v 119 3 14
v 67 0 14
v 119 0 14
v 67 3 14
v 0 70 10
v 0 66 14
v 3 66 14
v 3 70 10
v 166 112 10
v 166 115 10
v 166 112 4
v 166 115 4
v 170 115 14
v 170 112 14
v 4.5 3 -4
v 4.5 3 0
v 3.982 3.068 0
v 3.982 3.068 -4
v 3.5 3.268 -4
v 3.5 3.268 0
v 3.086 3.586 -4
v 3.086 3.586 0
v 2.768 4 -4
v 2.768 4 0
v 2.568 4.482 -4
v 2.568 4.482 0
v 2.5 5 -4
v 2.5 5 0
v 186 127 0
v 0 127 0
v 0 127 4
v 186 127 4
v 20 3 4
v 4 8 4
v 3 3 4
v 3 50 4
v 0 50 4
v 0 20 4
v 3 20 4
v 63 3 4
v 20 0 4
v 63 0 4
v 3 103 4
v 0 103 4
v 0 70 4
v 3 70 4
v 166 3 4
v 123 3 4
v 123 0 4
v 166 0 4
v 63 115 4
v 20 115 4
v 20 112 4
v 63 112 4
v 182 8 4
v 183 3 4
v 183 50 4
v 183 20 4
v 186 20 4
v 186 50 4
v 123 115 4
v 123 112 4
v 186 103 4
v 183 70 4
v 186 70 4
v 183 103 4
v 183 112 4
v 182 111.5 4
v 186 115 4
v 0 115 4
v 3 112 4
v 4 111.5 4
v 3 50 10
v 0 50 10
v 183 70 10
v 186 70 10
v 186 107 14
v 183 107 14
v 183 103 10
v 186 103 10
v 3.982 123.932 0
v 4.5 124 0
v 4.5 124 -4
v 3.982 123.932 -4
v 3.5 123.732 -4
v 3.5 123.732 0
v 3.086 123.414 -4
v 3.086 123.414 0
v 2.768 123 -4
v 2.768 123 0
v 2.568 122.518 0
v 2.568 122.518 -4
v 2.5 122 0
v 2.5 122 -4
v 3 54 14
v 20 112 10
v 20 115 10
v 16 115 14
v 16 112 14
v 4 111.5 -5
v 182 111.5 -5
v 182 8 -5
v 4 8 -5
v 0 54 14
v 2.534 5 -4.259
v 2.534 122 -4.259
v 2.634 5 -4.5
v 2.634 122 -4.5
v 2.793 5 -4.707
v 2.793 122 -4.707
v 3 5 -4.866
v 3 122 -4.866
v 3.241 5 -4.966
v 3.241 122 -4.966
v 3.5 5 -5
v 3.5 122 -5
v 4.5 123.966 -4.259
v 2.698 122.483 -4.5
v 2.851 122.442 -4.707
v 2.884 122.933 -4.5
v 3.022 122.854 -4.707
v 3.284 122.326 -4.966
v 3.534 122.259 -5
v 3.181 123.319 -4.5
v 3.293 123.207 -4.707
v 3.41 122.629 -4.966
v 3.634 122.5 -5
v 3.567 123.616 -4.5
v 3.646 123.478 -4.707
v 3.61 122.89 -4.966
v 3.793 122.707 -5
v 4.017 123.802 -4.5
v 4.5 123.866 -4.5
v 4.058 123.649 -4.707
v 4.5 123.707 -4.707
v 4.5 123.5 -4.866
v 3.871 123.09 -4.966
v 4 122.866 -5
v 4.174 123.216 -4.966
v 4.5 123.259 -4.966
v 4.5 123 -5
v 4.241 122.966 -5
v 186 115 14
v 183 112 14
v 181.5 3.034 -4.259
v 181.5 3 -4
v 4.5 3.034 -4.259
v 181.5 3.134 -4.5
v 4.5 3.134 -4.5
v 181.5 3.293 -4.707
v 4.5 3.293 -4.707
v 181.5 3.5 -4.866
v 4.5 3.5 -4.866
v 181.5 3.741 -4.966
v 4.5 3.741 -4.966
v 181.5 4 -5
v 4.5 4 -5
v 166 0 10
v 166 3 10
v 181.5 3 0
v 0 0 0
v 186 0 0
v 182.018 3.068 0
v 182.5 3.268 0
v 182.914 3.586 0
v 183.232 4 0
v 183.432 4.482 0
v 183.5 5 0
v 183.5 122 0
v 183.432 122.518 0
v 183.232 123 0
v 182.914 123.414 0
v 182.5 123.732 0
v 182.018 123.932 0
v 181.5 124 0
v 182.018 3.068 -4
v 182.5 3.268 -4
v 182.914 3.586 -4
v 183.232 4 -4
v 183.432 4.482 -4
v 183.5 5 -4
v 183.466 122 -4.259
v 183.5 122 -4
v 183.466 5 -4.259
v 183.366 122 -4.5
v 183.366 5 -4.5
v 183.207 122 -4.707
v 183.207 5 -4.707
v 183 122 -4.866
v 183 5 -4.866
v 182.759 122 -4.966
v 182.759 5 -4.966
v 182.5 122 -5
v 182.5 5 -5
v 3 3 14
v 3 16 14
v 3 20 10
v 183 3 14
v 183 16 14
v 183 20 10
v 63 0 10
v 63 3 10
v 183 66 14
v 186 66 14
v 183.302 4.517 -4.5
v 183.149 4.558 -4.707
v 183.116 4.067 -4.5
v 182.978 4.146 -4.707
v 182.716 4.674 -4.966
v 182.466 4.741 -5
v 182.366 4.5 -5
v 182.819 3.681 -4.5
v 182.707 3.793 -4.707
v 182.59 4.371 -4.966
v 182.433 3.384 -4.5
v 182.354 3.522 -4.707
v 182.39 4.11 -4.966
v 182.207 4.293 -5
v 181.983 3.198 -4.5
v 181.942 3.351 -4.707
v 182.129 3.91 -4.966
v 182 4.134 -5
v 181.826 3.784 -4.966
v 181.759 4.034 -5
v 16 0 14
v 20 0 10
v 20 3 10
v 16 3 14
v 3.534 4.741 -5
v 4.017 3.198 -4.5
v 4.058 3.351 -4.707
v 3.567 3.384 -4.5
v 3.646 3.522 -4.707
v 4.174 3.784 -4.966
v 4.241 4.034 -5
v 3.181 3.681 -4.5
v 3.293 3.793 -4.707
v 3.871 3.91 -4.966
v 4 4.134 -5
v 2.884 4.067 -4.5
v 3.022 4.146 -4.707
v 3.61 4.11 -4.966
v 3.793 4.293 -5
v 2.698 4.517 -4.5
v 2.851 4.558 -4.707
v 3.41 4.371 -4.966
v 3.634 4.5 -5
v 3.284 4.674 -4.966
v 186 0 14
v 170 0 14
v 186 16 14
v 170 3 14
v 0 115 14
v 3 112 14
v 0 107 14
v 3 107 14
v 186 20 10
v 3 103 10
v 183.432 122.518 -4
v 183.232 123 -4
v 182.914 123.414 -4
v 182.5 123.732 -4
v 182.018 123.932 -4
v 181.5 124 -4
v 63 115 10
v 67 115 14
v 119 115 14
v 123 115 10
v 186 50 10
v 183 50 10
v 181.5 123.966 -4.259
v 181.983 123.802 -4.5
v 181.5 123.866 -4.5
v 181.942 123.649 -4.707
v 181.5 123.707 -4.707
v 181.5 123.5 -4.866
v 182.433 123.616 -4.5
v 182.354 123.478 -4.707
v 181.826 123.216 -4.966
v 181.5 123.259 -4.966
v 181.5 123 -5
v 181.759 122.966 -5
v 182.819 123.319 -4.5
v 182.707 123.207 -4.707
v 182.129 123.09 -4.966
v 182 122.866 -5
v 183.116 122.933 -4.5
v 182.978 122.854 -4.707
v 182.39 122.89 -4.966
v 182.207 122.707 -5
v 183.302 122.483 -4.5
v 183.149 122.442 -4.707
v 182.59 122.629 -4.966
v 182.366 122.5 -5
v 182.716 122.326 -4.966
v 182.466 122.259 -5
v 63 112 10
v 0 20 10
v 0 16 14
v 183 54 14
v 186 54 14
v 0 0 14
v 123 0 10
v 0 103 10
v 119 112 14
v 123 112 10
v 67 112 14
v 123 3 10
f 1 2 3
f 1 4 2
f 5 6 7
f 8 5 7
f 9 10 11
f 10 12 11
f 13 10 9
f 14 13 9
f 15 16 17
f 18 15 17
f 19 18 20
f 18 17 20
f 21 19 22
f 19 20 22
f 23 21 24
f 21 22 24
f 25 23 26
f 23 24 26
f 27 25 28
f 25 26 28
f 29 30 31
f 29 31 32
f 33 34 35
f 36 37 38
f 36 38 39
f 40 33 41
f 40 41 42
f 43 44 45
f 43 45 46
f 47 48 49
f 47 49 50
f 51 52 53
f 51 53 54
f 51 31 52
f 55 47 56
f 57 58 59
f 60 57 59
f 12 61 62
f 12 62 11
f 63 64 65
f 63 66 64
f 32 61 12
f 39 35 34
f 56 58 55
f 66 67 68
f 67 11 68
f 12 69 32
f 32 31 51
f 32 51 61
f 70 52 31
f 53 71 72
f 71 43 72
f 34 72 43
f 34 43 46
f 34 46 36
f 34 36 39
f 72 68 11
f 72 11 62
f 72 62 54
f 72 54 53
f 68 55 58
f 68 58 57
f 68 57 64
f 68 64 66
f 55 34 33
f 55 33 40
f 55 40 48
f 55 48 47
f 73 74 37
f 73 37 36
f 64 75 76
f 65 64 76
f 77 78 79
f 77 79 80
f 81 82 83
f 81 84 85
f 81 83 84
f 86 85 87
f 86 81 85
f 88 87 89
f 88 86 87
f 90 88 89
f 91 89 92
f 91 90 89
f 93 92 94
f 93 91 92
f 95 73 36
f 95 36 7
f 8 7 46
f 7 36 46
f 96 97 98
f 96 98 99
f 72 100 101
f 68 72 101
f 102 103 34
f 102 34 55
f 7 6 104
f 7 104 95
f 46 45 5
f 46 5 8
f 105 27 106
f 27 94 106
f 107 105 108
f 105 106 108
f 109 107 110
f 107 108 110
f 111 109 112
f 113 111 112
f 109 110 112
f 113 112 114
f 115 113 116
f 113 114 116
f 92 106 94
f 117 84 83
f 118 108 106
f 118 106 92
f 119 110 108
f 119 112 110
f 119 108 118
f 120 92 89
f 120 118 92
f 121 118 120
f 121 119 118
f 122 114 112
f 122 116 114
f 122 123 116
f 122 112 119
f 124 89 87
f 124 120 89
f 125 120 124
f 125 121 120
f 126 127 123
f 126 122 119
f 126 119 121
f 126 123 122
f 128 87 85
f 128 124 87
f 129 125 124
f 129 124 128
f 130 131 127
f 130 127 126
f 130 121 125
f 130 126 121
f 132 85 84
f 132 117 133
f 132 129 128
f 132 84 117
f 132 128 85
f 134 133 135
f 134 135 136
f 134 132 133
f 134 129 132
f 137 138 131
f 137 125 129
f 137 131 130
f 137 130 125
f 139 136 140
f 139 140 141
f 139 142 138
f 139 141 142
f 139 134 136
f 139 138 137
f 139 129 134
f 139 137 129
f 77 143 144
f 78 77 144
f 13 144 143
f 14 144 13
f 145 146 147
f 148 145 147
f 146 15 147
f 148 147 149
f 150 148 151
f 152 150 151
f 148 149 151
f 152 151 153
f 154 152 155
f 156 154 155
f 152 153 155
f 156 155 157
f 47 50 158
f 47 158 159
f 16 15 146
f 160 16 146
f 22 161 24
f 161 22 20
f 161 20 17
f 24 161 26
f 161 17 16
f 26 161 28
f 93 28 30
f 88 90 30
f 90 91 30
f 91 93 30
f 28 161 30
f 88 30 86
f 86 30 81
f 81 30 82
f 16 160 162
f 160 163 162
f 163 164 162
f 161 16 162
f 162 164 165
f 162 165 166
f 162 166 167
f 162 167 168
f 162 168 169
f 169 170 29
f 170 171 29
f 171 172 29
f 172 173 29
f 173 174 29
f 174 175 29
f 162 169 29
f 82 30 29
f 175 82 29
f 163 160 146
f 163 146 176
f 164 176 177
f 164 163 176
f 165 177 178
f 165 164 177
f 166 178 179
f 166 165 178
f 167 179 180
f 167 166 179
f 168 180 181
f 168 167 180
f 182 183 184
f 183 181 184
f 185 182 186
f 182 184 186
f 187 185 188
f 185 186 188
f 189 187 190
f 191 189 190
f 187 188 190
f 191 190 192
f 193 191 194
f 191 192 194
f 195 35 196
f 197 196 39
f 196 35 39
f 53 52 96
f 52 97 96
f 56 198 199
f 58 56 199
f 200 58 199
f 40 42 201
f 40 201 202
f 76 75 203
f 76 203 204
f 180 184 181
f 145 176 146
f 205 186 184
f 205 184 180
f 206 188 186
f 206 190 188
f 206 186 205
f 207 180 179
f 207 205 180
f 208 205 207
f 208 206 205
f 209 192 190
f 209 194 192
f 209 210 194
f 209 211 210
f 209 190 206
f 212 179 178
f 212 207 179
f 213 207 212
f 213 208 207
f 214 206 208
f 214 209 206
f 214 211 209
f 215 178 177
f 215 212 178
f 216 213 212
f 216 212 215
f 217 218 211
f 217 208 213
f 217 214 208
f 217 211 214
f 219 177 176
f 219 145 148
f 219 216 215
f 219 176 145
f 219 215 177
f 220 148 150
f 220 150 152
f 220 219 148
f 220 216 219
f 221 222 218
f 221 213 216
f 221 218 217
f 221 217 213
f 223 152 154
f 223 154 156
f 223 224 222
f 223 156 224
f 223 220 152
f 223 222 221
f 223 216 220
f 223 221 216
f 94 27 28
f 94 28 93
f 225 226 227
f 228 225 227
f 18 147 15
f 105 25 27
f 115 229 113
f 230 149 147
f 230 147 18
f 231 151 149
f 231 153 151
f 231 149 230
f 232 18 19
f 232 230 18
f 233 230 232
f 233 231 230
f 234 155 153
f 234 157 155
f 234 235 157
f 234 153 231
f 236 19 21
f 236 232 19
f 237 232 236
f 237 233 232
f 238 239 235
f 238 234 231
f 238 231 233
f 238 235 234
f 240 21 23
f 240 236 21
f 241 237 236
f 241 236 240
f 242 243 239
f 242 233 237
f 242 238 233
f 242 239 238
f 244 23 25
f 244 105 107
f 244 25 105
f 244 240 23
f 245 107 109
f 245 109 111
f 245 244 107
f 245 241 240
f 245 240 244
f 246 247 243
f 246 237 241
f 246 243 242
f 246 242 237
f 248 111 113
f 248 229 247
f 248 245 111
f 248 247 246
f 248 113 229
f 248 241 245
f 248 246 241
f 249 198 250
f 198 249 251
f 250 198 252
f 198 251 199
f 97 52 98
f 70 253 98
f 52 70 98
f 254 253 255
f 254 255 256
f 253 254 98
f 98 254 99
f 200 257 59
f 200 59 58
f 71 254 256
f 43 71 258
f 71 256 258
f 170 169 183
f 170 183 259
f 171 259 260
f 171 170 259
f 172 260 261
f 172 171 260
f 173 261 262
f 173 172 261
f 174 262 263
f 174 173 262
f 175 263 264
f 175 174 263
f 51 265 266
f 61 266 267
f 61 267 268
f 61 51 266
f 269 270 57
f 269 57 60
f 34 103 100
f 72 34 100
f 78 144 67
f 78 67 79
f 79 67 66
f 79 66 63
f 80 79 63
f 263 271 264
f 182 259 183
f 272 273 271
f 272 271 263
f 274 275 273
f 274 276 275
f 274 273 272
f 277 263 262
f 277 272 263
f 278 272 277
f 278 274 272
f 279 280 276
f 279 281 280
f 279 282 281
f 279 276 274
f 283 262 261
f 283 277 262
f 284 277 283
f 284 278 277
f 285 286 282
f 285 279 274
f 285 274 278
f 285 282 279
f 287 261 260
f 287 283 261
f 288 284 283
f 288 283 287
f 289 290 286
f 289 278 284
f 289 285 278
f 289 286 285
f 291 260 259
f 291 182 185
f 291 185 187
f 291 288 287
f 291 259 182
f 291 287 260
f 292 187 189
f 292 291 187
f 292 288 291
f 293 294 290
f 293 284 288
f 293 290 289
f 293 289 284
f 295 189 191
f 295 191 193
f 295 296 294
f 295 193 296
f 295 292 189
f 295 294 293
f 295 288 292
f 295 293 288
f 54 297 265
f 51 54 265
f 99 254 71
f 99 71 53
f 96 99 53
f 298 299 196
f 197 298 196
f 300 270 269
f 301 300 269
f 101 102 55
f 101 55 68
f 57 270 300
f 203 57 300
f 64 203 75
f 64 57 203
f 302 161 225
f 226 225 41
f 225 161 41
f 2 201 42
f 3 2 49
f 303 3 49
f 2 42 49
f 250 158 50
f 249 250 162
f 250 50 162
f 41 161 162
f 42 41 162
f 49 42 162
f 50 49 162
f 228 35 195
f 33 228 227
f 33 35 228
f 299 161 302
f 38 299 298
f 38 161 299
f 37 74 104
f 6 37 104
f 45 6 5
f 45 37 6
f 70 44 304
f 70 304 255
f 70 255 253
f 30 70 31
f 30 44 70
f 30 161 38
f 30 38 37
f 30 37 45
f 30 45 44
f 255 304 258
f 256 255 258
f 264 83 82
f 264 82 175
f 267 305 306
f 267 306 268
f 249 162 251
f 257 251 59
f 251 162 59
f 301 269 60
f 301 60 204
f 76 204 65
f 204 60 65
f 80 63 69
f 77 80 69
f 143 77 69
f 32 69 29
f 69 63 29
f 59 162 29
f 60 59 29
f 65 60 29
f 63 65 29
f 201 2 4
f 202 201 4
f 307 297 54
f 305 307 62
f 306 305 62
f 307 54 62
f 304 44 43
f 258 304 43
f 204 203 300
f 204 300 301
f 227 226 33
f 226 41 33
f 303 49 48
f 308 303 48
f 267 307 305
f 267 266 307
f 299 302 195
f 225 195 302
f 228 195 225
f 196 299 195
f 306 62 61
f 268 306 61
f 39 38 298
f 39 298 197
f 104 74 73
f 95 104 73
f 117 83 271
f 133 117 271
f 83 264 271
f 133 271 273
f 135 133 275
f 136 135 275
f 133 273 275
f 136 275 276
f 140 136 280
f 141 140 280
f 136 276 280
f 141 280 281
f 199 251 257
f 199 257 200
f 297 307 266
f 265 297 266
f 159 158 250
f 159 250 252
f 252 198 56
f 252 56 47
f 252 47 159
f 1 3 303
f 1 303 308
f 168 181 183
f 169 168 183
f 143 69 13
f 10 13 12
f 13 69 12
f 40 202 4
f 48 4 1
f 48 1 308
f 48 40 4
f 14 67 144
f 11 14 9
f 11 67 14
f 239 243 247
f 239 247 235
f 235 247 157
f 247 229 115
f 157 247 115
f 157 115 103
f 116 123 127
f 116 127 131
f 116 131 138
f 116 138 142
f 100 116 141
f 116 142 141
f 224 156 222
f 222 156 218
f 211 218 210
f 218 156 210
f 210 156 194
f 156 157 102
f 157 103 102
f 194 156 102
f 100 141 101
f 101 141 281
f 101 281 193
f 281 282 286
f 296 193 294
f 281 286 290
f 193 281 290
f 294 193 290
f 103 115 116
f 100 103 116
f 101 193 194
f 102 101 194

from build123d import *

# Parameters (mm, degrees)
BOX035_W               = 60
BOX035_H               = 3
BOX035_DEPTH           = 11
BOX034_W               = 200
BOX034_H               = 30
BOX034_DEPTH           = 20
BOX033_W               = 60
BOX033_H               = 3
BOX033_DEPTH           = 11
BOX025_W               = 3
BOX025_H               = 20
BOX025_DEPTH           = 11
BOX026_W               = 3
BOX026_H               = 20
BOX026_DEPTH           = 11
BOX024_W               = 30
BOX024_H               = 20
BOX024_DEPTH           = 11
BOX023_W               = 20
BOX023_H               = 20
BOX023_DEPTH           = 11
CUT010_PLACEMENT_ANGLE = 180
BOX032_W               = 30
BOX032_H               = 20
BOX032_DEPTH           = 11
BOX031_W               = 20
BOX031_H               = 20
BOX031_DEPTH           = 11
CUT013_PLACEMENT_ANGLE = 180
BOX030_W               = 30
BOX030_H               = 20
BOX030_DEPTH           = 11
BOX029_W               = 20
BOX029_H               = 20
BOX029_DEPTH           = 11
CUT012_PLACEMENT_ANGLE = 180
BOX022_W               = 30
BOX022_H               = 20
BOX022_DEPTH           = 11
BOX021_W               = 20
BOX021_H               = 20
BOX021_DEPTH           = 11
CHAMFER006_SIZE        = 4
BOX018_W               = 178
BOX018_H               = 103.5
BOX018_DEPTH           = 30
BOX019_W               = 181
BOX019_H               = 121
BOX019_DEPTH           = 5
BOX017_W               = 186
BOX017_H               = 127
BOX017_DEPTH           = 4
FILLET008_R            = 2
FILLET009_R            = 1


with BuildPart() as cube032:
    # Box035 → Box035 (new body)
    with BuildSketch(Plane(origin=(63, 0, 4), x_dir=(1, 0, 0), z_dir=(0, 0, 1))):
        with Locations((30, 1.5)):
            Rectangle(BOX035_W, BOX035_H)
    extrude(amount=BOX035_DEPTH)


with BuildPart() as cube031:
    # Box034 → Box034 (new body)
    with BuildSketch(Plane(origin=(-10, 73, -5), x_dir=(1, 0, 0), z_dir=(0, 0, 1))):
        with Locations((100, 15)):
            Rectangle(BOX034_W, BOX034_H)
    extrude(amount=BOX034_DEPTH)


with BuildPart() as cube030:
    # Box033 → Box033 (new body)
    with BuildSketch(Plane(origin=(63, 112, 4), x_dir=(1, 0, 0), z_dir=(0, 0, 1))):
        with Locations((30, 1.5)):
            Rectangle(BOX033_W, BOX033_H)
    extrude(amount=BOX033_DEPTH)


with BuildPart() as cube022:
    # Box025 → Box025 (new body)
    with BuildSketch(Plane(origin=(0, 50, 4), x_dir=(1, 0, 0), z_dir=(0, 0, 1))):
        with Locations((1.5, 10)):
            Rectangle(BOX025_W, BOX025_H)
    extrude(amount=BOX025_DEPTH)


with BuildPart() as cube023:
    # Box026 → Box026 (new body)
    with BuildSketch(Plane(origin=(183, 50, 4), x_dir=(1, 0, 0), z_dir=(0, 0, 1))):
        with Locations((1.5, 10)):
            Rectangle(BOX026_W, BOX026_H)
    extrude(amount=BOX026_DEPTH)


with BuildPart() as cube021:
    # Box024 → Box024 (new body)
    with BuildSketch(Plane(origin=(3, 3, 0), x_dir=(1, 0, 0), z_dir=(0, 0, 1))):
        with Locations((15, 10)):
            Rectangle(BOX024_W, BOX024_H)
    extrude(amount=BOX024_DEPTH)


with BuildPart() as cut010:
    # Box023 → Box023 (new body)
    with BuildSketch(Plane.XY):
        with Locations((10, 10)):
            Rectangle(BOX023_W, BOX023_H)
    extrude(amount=BOX023_DEPTH)

    # Cut010: cut Cube021
    add(cube021.part, mode=Mode.SUBTRACT)


with BuildPart() as cut010_1:
    # Cut010 placement: moved
    add(cut010.part.moved(Location((186, 0, 15))).rotate(Axis((186, 0, 15), (0, 1, 0)), CUT010_PLACEMENT_ANGLE))


with BuildPart() as cube029:
    # Box032 → Box032 (new body)
    with BuildSketch(Plane(origin=(3, 3, 0), x_dir=(1, 0, 0), z_dir=(0, 0, 1))):
        with Locations((15, 10)):
            Rectangle(BOX032_W, BOX032_H)
    extrude(amount=BOX032_DEPTH)


with BuildPart() as cut013:
    # Box031 → Box031 (new body)
    with BuildSketch(Plane.XY):
        with Locations((10, 10)):
            Rectangle(BOX031_W, BOX031_H)
    extrude(amount=BOX031_DEPTH)

    # Cut013: cut Cube029
    add(cube029.part, mode=Mode.SUBTRACT)


with BuildPart() as cut013_1:
    # Cut013 placement: moved
    add(cut013.part.moved(Location((186, 115, 4))).rotate(Axis((186, 115, 4), (0, 0, 1)), CUT013_PLACEMENT_ANGLE))


with BuildPart() as cube027:
    # Box030 → Box030 (new body)
    with BuildSketch(Plane(origin=(3, 3, 0), x_dir=(1, 0, 0), z_dir=(0, 0, 1))):
        with Locations((15, 10)):
            Rectangle(BOX030_W, BOX030_H)
    extrude(amount=BOX030_DEPTH)


with BuildPart() as cut012:
    # Box029 → Box029 (new body)
    with BuildSketch(Plane.XY):
        with Locations((10, 10)):
            Rectangle(BOX029_W, BOX029_H)
    extrude(amount=BOX029_DEPTH)

    # Cut012: cut Cube027
    add(cube027.part, mode=Mode.SUBTRACT)


with BuildPart() as cut012_1:
    # Cut012 placement: moved
    add(cut012.part.moved(Location((0, 115, 15))).rotate(Axis((0, 115, 15), (1, 0, 0)), CUT012_PLACEMENT_ANGLE))


with BuildPart() as cube019:
    # Box022 → Box022 (new body)
    with BuildSketch(Plane(origin=(3, 3, 0), x_dir=(1, 0, 0), z_dir=(0, 0, 1))):
        with Locations((15, 10)):
            Rectangle(BOX022_W, BOX022_H)
    extrude(amount=BOX022_DEPTH)


with BuildPart() as chamfer006:
    # Box021 → Box021 (new body)
    with BuildSketch(Plane.XY):
        with Locations((10, 10)):
            Rectangle(BOX021_W, BOX021_H)
    extrude(amount=BOX021_DEPTH)

    # Cut009: cut Cube019
    add(cube019.part, mode=Mode.SUBTRACT)


with BuildPart() as chamfer006_1:
    # Cut009 placement: moved
    add(chamfer006.part.moved(Location((0, 0, 4))))

    # Fusion014: union Cube022, Cube023, Cut010, Cut013, Cut012
    add(cube022.part)
    add(cube023.part)
    add(cut010_1.part)
    add(cut013_1.part)
    add(cut012_1.part)

    # Fusion015: union Cube030
    add(cube030.part)

    # Cut014: cut Cube031
    add(cube031.part, mode=Mode.SUBTRACT)

    # Fusion016: union Cube032
    add(cube032.part)

    # Chamfer006
    chamfer006_edges = [chamfer006_1.edges().sort_by_distance(p)[0] for p in [
        (184.5, 20, 15),
        (166, 1.5, 15),
        (63, 113.5, 15),
        (123, 113.5, 15),
        (1.5, 103, 15),
        (20, 113.5, 15),
        (184.5, 50, 15),
        (184.5, 70, 15),
        (184.5, 103, 15),
        (166, 113.5, 15),
        (63, 1.5, 15),
        (123, 1.5, 15),
        (1.5, 50, 15),
        (1.5, 70, 15),
        (1.5, 20, 15),
        (20, 1.5, 15),
    ]]
    chamfer(chamfer006_edges, length=CHAMFER006_SIZE)


with BuildPart() as chamfer006_2:
    # Chamfer006 placement: moved
    add(chamfer006_1.part.moved(Location((0, 0, -1))))


with BuildPart() as cutout:
    # Box018 → Box018 (new body)
    with BuildSketch(Plane(origin=(4, 8, -25), x_dir=(1, 0, 0), z_dir=(0, 0, 1))):
        with Locations((89, 51.75)):
            Rectangle(BOX018_W, BOX018_H)
    extrude(amount=BOX018_DEPTH)


with BuildPart() as cube016:
    # Box019 → Box019 (new body)
    with BuildSketch(Plane(origin=(2.5, 3, -5), x_dir=(1, 0, 0), z_dir=(0, 0, 1))):
        with Locations((90.5, 60.5)):
            Rectangle(BOX019_W, BOX019_H)
    extrude(amount=BOX019_DEPTH)


with BuildPart() as fascia_modified:
    # Box017 → Box017 (new body)
    with BuildSketch(Plane.XY):
        with Locations((93, 63.5)):
            Rectangle(BOX017_W, BOX017_H)
    extrude(amount=BOX017_DEPTH)

    # Fusion007: union Cube016
    add(cube016.part)

    # Cut007: cut Cutout
    add(cutout.part, mode=Mode.SUBTRACT)

    # Fillet008
    fillet008_edges = [fascia_modified.edges().sort_by_distance(p)[0] for p in [
        (183.5, 124, -2.5),
        (2.5, 124, -2.5),
        (2.5, 3, -2.5),
        (183.5, 3, -2.5),
    ]]
    fillet(fillet008_edges, radius=FILLET008_R)

    # Fillet009
    fillet009_edges = [fascia_modified.edges().sort_by_distance(p)[0] for p in [
        (93, 124, -5),
        (3.085786, 123.414214, -5),
        (182.914214, 123.414214, -5),
        (2.5, 63.5, -5),
        (183.5, 63.5, -5),
        (3.085786, 3.585786, -5),
        (182.914214, 3.585786, -5),
        (93, 3, -5),
    ]]
    fillet(fillet009_edges, radius=FILLET009_R)

    # Fusion017: union Chamfer006
    add(chamfer006_2.part)


solid = fascia_modified.part
